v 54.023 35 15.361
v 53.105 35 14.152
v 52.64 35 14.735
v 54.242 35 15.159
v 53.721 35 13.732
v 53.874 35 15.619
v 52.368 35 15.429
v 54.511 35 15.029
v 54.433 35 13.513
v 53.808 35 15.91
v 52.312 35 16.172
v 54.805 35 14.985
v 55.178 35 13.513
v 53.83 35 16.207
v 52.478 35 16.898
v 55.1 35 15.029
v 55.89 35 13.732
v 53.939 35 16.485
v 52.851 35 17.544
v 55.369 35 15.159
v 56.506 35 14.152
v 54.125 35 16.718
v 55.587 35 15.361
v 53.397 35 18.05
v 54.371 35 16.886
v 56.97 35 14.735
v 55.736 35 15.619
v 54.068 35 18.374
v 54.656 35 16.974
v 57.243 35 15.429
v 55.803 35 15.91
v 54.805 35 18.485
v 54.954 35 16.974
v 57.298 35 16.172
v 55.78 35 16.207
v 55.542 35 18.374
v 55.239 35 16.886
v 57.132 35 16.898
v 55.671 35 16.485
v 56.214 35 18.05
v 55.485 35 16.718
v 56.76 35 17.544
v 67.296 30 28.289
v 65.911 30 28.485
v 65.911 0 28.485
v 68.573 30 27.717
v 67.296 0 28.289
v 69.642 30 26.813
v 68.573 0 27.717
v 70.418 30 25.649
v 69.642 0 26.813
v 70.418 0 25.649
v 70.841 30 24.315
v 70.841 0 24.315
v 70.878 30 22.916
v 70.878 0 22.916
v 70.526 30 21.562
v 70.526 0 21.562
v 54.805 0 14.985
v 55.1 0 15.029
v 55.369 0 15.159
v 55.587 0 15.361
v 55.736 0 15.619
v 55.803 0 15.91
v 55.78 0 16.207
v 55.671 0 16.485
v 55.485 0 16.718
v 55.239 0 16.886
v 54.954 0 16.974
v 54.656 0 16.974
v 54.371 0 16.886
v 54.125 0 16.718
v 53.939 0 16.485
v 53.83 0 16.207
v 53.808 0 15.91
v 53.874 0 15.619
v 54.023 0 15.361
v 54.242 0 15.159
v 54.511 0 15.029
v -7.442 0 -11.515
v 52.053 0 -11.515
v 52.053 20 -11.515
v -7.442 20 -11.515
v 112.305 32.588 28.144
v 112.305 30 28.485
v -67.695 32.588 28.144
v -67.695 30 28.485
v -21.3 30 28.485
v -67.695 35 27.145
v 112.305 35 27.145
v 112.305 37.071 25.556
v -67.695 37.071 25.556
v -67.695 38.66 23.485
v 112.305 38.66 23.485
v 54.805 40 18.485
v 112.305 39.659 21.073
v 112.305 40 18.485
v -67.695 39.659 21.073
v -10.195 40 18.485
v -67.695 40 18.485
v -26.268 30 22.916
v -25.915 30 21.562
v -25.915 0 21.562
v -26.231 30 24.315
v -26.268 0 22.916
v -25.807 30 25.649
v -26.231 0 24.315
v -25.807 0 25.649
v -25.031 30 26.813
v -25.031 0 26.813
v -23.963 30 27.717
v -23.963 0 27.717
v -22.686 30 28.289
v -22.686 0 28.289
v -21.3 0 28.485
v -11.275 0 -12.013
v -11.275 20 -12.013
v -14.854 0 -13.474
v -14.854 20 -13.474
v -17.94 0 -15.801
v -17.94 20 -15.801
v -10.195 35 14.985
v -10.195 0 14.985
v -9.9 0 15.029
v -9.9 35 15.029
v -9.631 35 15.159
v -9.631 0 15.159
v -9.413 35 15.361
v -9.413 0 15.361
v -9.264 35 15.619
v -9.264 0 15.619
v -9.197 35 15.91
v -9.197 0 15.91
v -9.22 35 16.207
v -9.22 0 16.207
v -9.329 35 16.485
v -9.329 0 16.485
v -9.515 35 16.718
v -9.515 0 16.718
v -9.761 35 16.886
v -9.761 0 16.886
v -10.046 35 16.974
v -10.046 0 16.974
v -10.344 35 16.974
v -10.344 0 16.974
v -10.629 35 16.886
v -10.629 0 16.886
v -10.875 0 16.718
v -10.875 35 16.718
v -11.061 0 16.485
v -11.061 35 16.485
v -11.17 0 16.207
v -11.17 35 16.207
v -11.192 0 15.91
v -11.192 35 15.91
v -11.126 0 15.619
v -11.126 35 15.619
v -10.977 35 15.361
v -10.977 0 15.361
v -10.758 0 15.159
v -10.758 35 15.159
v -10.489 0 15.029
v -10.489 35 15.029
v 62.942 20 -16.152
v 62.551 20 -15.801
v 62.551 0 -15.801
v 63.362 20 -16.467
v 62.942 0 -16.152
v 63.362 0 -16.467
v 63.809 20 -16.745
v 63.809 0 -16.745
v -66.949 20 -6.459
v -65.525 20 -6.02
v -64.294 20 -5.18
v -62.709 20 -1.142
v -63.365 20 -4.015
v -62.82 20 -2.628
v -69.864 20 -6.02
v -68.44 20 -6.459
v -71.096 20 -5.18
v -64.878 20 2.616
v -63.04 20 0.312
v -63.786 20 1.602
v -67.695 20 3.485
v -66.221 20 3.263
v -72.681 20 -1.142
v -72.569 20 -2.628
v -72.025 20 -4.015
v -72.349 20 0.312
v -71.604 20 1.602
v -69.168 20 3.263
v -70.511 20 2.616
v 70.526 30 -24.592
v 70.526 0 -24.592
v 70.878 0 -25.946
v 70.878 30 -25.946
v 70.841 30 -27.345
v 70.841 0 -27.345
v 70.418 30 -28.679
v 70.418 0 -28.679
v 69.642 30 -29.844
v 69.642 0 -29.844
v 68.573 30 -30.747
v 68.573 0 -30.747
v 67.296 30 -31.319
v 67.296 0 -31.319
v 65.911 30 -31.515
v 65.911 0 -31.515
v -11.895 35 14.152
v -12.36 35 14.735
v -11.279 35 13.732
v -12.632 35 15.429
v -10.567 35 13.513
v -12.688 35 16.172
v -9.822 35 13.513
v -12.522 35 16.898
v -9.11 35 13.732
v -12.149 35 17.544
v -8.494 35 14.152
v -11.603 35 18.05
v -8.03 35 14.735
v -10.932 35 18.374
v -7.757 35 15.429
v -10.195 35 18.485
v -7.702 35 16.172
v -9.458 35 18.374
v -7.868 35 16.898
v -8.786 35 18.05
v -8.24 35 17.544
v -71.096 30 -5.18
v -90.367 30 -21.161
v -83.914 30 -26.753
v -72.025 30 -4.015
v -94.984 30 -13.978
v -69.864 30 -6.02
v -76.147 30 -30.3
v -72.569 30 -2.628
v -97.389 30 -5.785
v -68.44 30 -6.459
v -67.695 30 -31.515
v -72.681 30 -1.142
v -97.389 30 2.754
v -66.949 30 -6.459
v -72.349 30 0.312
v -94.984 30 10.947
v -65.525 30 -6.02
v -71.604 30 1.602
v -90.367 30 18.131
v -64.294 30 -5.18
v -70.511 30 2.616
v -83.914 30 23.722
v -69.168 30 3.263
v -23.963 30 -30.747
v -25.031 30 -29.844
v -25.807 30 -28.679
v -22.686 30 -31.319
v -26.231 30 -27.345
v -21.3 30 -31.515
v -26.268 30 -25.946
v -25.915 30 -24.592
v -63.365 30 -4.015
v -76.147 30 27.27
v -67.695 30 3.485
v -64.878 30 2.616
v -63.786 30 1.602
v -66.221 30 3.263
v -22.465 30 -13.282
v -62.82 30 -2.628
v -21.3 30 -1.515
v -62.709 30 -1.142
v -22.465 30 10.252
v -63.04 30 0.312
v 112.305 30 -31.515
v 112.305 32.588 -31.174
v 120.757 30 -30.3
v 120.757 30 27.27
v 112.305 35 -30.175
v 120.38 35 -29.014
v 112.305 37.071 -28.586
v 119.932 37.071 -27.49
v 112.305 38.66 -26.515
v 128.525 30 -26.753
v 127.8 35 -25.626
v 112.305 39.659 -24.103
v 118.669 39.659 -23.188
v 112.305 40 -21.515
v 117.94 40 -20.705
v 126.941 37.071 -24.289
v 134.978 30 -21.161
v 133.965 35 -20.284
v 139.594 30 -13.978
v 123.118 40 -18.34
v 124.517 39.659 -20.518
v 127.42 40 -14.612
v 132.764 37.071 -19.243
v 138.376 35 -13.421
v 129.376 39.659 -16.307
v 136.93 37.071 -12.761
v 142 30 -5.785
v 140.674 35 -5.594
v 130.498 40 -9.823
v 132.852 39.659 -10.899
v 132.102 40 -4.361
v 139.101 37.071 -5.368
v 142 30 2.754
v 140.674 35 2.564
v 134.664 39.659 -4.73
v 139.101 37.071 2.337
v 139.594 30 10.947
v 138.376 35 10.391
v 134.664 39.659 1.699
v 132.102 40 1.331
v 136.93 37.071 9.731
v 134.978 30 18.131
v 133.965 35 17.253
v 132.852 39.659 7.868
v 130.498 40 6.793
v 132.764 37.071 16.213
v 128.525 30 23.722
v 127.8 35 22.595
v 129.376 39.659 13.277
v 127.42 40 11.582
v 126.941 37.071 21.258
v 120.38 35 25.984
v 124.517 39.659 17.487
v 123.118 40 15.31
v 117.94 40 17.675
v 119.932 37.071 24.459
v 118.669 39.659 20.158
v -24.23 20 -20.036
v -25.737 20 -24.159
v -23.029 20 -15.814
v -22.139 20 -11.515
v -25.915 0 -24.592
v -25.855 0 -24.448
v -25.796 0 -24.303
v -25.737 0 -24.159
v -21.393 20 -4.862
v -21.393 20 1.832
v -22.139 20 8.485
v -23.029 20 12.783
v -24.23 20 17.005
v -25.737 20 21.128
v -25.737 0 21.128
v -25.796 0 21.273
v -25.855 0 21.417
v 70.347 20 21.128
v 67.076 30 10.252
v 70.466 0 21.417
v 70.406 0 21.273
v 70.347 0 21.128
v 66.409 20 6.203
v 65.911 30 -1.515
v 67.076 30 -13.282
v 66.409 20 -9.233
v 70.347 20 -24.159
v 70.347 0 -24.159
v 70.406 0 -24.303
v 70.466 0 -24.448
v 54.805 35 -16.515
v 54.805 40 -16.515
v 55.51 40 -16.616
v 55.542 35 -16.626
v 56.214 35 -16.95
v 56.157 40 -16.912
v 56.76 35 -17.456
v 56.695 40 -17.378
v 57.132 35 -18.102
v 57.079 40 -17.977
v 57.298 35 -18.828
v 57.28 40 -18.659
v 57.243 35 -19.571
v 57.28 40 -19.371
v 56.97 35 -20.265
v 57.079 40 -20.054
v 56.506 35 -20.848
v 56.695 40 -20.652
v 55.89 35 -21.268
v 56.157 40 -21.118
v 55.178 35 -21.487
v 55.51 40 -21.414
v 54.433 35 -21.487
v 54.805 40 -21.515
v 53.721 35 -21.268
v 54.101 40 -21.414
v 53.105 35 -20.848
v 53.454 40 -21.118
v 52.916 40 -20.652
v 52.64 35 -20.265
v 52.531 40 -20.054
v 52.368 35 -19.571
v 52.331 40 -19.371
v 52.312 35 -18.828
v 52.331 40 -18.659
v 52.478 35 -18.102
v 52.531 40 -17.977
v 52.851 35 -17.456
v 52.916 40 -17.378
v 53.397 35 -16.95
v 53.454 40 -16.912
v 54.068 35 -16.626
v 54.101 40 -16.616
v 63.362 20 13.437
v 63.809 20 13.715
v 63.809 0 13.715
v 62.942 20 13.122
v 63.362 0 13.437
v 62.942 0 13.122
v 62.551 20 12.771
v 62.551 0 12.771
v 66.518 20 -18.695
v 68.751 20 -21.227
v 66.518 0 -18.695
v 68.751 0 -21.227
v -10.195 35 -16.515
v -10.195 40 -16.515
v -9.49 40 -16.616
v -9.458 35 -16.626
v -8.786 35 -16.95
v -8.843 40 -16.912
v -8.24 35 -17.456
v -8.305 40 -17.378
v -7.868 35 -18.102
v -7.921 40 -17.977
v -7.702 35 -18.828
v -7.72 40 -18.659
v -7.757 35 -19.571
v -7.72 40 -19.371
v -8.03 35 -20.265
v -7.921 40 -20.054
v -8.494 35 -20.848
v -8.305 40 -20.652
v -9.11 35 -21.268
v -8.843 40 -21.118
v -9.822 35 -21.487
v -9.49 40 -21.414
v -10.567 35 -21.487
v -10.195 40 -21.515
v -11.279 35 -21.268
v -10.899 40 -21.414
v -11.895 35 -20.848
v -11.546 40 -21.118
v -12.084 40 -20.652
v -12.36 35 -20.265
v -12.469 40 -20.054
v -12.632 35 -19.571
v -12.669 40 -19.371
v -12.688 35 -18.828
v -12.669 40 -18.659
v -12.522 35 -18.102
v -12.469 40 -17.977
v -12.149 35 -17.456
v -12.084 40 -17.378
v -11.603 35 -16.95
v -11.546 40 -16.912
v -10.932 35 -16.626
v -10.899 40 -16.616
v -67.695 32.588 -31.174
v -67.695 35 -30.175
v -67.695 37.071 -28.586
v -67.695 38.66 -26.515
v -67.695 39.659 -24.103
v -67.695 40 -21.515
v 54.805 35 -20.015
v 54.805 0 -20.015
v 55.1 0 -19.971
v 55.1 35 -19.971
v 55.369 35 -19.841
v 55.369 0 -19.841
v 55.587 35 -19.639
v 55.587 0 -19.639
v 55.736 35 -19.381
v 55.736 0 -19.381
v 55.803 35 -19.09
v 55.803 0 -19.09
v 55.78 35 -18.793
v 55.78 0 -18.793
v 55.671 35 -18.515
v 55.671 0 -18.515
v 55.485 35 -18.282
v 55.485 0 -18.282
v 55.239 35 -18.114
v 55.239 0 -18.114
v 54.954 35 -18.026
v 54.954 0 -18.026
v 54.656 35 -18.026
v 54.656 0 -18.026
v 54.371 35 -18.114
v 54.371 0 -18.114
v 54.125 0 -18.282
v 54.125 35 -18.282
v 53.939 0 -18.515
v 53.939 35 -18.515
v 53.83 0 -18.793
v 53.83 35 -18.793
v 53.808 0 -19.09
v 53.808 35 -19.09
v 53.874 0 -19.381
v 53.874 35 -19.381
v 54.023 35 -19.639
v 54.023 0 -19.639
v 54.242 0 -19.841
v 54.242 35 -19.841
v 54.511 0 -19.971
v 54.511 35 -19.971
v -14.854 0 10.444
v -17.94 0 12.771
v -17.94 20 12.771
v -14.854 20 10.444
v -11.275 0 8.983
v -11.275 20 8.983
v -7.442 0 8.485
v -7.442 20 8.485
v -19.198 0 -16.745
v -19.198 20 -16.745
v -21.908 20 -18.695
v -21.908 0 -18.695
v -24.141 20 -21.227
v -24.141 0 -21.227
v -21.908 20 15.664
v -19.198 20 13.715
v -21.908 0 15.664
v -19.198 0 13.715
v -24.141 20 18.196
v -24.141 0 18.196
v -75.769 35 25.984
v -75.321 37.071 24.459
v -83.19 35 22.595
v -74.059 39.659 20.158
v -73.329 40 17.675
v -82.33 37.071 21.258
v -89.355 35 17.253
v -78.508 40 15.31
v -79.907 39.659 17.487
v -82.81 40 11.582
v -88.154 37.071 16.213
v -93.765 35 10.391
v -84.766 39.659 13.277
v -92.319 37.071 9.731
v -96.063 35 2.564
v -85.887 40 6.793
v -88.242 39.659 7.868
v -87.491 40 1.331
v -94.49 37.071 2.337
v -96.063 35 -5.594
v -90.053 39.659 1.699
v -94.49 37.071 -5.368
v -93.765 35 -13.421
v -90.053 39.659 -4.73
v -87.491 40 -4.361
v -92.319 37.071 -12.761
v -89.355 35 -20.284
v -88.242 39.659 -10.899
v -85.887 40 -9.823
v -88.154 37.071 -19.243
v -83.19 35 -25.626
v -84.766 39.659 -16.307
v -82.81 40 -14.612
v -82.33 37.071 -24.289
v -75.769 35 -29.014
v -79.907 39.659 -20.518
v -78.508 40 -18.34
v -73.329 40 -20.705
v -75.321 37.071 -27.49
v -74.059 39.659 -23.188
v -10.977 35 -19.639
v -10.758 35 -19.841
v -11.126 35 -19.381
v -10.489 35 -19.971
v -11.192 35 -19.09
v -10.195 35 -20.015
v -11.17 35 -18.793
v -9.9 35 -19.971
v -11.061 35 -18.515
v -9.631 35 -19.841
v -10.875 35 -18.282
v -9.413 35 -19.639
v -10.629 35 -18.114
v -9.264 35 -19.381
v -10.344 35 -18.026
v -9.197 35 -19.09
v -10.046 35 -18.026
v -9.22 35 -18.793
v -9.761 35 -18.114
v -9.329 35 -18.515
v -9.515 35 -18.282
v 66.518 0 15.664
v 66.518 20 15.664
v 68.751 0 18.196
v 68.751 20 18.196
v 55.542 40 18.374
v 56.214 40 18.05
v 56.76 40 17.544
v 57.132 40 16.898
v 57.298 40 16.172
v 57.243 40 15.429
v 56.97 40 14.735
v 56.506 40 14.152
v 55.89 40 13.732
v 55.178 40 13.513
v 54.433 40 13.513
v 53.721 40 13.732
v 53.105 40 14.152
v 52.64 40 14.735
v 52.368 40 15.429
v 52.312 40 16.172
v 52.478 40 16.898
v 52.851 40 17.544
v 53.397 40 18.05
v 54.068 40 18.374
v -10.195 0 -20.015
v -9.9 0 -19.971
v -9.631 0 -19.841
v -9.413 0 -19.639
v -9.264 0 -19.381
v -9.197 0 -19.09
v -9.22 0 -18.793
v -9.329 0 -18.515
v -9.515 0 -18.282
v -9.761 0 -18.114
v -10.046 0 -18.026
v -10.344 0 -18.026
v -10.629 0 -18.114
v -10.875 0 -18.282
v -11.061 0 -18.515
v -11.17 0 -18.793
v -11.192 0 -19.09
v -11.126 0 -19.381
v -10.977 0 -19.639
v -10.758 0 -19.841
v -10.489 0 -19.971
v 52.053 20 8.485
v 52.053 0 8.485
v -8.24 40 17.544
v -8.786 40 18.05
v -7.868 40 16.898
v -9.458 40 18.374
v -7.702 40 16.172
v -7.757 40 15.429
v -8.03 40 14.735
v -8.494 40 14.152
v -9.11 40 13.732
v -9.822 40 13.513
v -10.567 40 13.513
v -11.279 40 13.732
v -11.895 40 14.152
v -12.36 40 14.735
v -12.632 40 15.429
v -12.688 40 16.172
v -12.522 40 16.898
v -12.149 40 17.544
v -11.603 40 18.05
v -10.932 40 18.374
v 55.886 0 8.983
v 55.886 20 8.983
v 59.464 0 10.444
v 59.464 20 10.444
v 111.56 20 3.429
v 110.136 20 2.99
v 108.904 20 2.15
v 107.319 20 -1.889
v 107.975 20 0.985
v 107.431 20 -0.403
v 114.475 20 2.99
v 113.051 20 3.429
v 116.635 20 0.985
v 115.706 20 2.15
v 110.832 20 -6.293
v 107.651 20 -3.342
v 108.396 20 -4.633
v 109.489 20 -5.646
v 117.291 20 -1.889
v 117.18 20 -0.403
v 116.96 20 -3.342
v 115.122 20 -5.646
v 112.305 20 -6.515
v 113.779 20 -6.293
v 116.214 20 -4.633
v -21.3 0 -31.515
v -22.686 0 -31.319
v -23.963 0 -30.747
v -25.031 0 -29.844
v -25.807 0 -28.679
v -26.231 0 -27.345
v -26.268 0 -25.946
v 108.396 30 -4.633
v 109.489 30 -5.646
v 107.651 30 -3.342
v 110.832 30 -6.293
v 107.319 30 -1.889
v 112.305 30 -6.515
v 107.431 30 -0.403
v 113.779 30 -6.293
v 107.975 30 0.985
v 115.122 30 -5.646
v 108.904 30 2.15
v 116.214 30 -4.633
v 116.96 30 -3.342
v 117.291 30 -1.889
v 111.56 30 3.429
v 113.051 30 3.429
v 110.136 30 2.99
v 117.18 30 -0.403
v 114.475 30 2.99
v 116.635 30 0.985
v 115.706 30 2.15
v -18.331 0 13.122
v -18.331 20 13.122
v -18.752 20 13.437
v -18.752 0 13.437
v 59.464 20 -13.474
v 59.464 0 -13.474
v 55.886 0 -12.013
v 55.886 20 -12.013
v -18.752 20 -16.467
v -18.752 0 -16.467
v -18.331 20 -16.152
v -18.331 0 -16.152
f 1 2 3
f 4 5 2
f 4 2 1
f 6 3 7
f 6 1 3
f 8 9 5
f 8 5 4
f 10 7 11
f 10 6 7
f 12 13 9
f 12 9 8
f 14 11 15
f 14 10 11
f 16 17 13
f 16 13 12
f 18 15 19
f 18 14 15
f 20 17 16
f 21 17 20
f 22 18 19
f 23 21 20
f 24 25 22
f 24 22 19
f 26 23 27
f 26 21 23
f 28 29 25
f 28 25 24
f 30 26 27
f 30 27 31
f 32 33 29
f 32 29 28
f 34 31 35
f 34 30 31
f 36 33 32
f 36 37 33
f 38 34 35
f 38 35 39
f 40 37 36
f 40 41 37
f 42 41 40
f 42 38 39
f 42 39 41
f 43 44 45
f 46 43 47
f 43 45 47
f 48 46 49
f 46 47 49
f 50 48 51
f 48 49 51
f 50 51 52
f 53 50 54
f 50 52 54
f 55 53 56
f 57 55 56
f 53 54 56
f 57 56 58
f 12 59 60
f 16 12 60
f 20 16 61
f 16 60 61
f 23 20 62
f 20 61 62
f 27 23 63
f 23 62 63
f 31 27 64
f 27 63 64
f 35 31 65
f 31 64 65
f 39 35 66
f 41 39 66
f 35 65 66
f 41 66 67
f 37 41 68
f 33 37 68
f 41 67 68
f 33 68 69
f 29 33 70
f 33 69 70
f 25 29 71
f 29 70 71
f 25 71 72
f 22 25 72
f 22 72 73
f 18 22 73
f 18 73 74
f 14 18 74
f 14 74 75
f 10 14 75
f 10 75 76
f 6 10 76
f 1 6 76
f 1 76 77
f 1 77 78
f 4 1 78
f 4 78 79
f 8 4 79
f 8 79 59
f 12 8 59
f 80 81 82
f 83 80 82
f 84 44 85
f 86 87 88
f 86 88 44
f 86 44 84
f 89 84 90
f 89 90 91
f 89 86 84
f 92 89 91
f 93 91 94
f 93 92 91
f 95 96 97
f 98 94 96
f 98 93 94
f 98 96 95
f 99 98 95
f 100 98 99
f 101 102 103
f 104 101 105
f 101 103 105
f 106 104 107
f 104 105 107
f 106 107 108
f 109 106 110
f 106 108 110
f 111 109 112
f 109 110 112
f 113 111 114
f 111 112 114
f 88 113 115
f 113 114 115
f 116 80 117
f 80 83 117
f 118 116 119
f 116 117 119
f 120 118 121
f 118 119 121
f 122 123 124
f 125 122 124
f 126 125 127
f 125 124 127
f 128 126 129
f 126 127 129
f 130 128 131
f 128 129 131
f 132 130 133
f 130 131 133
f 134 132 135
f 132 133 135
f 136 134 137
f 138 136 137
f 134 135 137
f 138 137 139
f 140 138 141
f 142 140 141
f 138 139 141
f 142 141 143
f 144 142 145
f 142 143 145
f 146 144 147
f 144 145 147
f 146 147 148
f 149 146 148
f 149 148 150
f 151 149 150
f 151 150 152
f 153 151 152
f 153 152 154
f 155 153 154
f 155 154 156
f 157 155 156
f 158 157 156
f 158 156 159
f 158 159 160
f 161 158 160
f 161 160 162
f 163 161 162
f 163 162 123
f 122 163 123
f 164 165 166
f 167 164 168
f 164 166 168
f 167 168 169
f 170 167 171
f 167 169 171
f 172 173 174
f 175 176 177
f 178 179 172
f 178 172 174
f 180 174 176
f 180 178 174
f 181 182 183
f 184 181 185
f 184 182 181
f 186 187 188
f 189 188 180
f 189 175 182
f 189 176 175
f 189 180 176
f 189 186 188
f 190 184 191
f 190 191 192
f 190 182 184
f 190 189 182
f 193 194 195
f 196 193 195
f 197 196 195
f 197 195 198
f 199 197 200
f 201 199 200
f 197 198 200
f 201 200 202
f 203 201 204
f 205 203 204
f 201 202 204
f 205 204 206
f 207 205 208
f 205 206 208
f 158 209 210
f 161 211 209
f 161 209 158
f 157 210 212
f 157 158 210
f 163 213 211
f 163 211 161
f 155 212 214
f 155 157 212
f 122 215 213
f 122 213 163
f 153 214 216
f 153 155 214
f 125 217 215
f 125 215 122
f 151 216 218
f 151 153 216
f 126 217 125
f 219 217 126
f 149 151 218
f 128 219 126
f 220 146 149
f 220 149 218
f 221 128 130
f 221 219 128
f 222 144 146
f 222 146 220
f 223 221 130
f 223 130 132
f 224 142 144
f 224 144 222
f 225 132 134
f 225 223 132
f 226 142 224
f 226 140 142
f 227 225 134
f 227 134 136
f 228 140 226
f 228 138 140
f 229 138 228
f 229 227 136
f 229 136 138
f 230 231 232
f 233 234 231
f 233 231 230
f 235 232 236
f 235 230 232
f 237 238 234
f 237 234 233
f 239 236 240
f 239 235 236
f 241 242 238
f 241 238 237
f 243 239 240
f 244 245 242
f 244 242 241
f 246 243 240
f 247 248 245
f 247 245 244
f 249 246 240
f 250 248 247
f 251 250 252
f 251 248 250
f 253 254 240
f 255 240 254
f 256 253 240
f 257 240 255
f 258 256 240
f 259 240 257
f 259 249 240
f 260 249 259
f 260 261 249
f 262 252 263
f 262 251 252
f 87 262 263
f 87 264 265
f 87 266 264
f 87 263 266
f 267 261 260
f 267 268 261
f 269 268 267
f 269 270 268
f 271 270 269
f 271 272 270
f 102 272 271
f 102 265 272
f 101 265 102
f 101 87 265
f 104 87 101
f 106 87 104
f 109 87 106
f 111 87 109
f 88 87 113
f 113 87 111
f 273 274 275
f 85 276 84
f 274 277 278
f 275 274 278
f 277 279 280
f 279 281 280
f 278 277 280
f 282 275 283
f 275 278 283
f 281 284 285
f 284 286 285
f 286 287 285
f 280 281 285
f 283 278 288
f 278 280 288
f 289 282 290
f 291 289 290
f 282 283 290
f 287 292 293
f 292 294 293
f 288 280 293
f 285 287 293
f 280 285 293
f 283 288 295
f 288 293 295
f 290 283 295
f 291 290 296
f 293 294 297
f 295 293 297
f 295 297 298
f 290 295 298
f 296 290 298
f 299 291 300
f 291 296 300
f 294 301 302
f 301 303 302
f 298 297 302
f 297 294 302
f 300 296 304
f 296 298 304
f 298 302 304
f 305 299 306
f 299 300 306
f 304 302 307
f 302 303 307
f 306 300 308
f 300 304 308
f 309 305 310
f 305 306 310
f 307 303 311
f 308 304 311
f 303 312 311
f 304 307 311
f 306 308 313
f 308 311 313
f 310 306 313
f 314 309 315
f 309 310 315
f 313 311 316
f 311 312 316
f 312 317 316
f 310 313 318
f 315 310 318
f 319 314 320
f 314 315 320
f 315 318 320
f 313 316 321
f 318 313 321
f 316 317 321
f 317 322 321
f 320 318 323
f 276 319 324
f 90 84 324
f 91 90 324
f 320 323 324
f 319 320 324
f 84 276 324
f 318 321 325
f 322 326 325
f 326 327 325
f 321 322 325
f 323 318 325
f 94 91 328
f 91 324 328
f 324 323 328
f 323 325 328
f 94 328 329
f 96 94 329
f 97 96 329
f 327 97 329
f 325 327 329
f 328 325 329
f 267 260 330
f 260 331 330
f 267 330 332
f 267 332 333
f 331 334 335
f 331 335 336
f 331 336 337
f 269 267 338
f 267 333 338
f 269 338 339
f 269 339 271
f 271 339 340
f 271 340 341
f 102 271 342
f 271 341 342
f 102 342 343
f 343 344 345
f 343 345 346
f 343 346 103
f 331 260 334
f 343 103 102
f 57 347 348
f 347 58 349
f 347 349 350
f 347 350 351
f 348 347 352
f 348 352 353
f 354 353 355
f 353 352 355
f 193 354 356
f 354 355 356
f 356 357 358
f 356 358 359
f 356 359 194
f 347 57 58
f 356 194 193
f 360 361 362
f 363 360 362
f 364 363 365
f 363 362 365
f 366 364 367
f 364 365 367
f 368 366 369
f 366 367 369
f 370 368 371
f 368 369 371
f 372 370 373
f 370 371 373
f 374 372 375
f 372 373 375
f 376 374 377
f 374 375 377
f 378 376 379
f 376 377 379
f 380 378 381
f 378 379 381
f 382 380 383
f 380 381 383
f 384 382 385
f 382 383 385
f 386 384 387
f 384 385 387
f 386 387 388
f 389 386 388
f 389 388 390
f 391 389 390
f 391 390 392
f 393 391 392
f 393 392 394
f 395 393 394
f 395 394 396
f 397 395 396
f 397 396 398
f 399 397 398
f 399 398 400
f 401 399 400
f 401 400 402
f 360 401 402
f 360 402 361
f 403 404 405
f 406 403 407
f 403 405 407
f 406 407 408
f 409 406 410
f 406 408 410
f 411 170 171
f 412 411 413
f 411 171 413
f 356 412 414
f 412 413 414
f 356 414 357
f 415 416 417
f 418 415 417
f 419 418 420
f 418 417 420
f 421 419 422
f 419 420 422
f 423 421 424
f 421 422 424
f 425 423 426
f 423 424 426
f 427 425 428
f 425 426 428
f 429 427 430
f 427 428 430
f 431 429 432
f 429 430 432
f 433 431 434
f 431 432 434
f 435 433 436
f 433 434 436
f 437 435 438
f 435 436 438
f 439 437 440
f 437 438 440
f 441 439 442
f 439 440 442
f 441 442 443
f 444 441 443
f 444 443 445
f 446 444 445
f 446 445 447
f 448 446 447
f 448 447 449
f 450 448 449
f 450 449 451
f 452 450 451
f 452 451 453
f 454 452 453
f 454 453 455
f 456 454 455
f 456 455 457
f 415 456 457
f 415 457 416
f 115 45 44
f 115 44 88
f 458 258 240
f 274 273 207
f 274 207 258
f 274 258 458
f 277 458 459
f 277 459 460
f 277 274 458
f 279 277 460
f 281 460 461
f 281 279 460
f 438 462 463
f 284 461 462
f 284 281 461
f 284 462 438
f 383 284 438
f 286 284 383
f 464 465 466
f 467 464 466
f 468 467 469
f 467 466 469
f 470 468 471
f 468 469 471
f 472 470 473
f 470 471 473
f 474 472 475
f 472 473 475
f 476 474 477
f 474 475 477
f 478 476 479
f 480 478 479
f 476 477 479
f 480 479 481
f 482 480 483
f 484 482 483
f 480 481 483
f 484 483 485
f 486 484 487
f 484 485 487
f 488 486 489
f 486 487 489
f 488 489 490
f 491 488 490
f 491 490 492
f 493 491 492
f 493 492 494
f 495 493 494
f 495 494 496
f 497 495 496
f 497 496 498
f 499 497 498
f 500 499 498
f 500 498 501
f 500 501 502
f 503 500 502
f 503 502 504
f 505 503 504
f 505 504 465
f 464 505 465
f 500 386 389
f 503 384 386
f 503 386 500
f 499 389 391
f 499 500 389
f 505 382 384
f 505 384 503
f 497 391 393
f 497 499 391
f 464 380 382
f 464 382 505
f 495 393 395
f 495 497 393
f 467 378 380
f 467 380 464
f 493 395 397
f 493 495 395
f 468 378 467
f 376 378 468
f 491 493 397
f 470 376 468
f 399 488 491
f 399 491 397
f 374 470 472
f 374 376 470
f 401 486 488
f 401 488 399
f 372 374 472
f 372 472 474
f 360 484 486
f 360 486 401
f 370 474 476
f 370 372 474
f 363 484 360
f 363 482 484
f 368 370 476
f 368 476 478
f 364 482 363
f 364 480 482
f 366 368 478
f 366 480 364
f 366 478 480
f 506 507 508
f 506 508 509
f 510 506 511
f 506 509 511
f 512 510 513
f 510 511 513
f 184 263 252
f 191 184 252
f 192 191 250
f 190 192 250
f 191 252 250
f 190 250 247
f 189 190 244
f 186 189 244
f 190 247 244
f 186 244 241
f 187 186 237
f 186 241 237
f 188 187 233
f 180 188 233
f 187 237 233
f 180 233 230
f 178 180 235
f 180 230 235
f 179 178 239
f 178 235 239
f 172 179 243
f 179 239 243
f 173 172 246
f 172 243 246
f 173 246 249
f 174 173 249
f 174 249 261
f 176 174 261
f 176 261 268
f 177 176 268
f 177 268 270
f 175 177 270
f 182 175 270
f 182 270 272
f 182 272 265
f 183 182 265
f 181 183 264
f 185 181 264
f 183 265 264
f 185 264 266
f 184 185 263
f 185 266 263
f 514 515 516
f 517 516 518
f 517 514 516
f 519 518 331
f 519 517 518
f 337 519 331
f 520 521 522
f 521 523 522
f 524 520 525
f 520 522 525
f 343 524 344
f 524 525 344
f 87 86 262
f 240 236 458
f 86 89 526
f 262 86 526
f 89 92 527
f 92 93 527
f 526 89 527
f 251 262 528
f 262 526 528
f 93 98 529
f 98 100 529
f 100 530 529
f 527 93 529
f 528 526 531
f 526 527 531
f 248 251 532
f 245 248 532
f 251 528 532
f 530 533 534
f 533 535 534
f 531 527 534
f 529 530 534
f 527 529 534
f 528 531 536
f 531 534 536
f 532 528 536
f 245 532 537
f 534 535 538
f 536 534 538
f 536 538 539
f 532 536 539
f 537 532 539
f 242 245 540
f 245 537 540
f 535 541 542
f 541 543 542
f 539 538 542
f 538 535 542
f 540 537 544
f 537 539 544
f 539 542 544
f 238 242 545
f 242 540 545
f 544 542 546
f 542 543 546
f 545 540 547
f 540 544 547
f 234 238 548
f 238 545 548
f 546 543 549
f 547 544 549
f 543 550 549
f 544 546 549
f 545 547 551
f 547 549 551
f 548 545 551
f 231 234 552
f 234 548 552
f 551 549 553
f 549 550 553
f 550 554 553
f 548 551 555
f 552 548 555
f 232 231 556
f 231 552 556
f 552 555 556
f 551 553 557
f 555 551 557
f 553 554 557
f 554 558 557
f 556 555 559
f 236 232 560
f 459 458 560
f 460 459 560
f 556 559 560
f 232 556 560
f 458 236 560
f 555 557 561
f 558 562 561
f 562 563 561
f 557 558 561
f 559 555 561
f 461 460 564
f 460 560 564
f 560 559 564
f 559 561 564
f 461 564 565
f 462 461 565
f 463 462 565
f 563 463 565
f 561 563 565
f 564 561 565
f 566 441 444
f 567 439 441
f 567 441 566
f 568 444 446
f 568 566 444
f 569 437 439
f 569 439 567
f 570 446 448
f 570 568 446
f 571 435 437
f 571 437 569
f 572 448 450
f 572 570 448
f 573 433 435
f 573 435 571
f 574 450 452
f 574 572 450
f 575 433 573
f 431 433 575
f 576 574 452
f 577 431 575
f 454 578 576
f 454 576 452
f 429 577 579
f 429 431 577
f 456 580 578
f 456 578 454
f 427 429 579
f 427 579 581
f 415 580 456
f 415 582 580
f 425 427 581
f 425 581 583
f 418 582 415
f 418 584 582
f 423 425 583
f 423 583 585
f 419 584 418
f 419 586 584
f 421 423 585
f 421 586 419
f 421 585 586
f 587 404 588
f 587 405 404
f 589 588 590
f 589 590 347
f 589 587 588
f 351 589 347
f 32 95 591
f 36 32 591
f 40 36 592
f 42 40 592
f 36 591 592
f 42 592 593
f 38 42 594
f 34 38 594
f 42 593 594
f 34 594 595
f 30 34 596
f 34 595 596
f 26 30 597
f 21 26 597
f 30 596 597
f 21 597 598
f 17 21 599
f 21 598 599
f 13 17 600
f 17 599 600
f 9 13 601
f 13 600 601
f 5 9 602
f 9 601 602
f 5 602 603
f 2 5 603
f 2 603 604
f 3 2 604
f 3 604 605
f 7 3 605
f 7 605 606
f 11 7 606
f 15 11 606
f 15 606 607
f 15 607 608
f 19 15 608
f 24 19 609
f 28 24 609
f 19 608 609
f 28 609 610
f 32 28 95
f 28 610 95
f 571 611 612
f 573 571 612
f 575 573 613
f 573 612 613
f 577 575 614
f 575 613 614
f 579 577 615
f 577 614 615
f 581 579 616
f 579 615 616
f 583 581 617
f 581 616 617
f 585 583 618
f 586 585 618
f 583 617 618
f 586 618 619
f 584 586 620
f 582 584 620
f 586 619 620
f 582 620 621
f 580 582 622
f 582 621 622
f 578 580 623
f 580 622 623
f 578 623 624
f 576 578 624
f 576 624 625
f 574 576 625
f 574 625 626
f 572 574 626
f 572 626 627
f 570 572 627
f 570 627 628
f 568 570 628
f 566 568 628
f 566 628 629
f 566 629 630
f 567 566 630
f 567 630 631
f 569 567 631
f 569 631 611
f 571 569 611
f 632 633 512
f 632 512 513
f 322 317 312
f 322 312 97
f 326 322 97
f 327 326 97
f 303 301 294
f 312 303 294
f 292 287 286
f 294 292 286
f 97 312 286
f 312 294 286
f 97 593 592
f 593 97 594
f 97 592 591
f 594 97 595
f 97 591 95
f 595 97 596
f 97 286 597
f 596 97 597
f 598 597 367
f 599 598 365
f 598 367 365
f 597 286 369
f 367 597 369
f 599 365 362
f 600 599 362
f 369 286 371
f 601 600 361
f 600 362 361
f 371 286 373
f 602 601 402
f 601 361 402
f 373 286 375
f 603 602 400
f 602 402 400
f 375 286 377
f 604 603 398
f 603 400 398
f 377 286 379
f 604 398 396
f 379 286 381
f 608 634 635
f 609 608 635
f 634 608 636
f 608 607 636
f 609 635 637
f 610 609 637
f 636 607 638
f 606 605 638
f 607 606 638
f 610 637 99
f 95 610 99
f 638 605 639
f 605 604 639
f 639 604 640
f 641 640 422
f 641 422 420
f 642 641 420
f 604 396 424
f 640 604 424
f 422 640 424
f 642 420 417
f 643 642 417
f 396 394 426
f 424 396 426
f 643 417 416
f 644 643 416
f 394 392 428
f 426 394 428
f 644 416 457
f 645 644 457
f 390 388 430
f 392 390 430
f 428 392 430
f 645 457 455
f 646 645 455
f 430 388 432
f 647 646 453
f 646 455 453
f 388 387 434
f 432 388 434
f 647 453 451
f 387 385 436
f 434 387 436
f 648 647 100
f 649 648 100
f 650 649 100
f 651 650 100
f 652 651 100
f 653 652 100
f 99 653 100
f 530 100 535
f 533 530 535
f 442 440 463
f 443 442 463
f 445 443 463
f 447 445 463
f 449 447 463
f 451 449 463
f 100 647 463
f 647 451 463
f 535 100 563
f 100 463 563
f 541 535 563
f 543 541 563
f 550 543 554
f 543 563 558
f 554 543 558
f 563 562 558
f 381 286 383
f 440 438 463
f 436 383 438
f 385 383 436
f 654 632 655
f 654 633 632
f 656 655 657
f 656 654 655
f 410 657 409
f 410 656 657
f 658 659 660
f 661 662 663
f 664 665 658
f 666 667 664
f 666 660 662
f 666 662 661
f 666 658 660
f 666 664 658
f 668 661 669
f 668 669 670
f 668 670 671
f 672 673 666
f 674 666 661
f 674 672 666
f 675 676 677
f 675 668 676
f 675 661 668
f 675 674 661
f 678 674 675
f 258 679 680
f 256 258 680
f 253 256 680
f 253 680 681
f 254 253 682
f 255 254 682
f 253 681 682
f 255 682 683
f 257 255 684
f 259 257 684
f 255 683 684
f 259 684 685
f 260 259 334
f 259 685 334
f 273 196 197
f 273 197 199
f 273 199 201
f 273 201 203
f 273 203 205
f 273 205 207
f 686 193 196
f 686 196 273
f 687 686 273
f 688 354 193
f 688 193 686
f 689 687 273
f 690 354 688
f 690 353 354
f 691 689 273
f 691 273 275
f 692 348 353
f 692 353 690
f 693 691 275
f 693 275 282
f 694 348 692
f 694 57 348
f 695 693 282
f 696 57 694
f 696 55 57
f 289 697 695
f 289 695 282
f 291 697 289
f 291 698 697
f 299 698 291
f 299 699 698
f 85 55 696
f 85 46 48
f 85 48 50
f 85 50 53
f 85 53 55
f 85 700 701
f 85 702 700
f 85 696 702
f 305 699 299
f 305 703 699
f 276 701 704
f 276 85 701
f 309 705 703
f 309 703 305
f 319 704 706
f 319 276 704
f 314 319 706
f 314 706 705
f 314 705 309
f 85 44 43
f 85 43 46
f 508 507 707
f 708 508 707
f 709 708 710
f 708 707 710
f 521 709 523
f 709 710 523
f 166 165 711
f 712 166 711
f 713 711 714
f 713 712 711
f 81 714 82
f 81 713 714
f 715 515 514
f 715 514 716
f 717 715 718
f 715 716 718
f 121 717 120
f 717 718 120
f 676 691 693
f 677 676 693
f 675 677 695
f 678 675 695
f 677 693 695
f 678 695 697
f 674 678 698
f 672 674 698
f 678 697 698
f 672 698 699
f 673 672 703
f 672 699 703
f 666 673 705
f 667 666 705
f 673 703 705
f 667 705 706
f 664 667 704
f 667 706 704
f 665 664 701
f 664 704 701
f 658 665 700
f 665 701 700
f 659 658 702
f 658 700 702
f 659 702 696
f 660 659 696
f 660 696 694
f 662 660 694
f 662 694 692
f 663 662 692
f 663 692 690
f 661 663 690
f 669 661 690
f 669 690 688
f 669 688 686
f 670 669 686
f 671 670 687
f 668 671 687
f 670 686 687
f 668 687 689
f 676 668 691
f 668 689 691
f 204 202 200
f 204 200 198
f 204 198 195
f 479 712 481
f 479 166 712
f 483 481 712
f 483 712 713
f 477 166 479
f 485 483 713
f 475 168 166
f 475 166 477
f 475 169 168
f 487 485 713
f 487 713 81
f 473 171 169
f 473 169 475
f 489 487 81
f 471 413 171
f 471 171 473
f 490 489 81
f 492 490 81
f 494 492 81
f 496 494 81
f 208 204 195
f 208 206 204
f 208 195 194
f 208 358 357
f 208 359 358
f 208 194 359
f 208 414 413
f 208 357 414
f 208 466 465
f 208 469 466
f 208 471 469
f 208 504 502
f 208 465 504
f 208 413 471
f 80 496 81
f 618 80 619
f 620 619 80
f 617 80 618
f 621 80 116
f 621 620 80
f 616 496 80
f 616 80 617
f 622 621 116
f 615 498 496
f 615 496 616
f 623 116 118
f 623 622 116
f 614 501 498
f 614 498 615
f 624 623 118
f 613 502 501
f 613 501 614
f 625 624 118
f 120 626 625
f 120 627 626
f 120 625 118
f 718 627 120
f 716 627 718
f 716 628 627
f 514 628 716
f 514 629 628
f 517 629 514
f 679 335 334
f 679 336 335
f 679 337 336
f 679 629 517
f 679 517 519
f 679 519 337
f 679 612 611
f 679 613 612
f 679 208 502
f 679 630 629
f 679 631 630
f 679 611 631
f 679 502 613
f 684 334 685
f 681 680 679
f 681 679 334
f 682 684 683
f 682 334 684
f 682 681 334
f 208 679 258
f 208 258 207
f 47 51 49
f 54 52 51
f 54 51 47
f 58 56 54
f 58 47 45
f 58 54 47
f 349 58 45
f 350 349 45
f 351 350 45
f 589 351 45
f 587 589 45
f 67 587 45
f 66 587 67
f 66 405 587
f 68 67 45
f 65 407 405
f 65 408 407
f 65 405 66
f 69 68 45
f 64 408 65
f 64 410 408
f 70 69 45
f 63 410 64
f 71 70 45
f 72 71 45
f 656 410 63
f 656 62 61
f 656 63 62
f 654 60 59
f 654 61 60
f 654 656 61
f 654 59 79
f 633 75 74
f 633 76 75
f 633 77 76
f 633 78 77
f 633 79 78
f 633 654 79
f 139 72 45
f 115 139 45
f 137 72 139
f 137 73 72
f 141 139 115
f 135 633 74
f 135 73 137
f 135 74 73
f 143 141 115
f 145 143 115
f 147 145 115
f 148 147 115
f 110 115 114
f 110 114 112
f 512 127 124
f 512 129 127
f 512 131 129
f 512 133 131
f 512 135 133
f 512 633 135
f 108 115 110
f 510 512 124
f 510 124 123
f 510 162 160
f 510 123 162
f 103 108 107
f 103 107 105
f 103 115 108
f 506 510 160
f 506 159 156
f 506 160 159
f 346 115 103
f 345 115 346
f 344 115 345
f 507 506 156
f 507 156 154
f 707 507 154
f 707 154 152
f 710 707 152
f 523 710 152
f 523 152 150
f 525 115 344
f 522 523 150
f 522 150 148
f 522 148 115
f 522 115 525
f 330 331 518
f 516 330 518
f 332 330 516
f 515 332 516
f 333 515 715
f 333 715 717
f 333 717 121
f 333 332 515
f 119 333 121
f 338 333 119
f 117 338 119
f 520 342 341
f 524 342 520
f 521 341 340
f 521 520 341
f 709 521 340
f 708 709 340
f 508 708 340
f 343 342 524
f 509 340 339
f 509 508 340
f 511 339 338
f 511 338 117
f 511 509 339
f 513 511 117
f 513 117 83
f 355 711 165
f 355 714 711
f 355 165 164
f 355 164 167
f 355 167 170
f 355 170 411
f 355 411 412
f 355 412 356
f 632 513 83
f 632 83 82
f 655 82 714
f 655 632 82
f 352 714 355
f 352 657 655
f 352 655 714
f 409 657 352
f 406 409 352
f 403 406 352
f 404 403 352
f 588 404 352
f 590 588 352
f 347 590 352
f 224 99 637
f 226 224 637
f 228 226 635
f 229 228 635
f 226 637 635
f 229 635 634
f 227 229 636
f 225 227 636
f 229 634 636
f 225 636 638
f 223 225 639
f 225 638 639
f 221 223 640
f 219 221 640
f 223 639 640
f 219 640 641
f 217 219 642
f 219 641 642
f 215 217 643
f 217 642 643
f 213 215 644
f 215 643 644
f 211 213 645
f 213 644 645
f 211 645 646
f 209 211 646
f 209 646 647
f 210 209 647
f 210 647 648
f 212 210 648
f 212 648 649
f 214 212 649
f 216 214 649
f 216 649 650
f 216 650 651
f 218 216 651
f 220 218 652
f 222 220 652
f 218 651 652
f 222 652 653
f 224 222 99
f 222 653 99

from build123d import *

# Parameters (mm, degrees)
BOSS_EXTRUDE1_DEPTH     = 40
FILLET1_R               = 10
CUT_EXTRUDE1_DEPTH      = 30
SKETCH4_R               = 5
BOSS_EXTRUDE3_DEPTH     = 10
CUT_EXTRUDE2_REACH      = 181.038
CUT_EXTRUDE2_END_RADIUS = 60
SKETCH5_W               = 20
SKETCH5_H               = 40
FILLET2_R               = 5
CUT_EXTRUDE3_REACH      = 153.142
SKETCH6_R               = 1
SKETCH7_R               = 2.5
CUT_EXTRUDE4_DEPTH      = 5
SKETCH8_R               = 6
CUT_EXTRUDE5_DEPTH      = 20
FILLET3_R               = 15


with BuildPart() as part:
    # Sketch1 → Boss-Extrude1 (new body)
    with BuildSketch(Plane(origin=(0, 0, 0), x_dir=(1, 0, 0), z_dir=(0, 1, 0))):
        with BuildLine():
            Line((-67.694698117, 31.515169882), (112.305301883, 31.515169882))
            ThreePointArc((112.305301883, 31.515169882), (142.305301883, 1.515169882), (112.305301883, -28.484830118))
            Line((112.305301883, -28.484830118), (-67.694698117, -28.484830118))
            ThreePointArc((-67.694698117, -28.484830118), (-97.694698117, 1.515169882), (-67.694698117, 31.515169882))
        make_face()
    extrude(amount=BOSS_EXTRUDE1_DEPTH)

    # Fillet1
    fillet1_edges = [part.edges().sort_by_distance(p)[0] for p in [
        (142.305301883, 40, -1.515169882),
        (22.305301883, 40, -31.515169882),
        (-97.694698117, 40, -1.515169882),
        (22.305301883, 40, 28.484830118),
    ]]
    fillet(fillet1_edges, radius=FILLET1_R)

    # Sketch3 → Cut-Extrude1 (cut)
    with BuildSketch(Plane.XZ):
        with BuildLine():
            Line((73.949041486, -31.515169882), (148.949041486, -31.515169882))
            Line((148.949041486, -31.515169882), (148.949041486, 28.484830118))
            Line((148.949041486, 28.484830118), (73.949041486, 28.484830118))
            ThreePointArc((73.949041486, 28.484830118), (65.910565713, -1.515169882), (73.949041486, -31.515169882))
        make_face()
        with BuildLine():
            Line((-29.33843772, 28.484830118), (-104.33843772, 28.484830118))
            Line((-104.33843772, 28.484830118), (-104.33843772, -31.515169882))
            Line((-104.33843772, -31.515169882), (-29.33843772, -31.515169882))
            ThreePointArc((-29.33843772, -31.515169882), (-21.299961947, -1.515169882), (-29.33843772, 28.484830118))
        make_face()
    extrude(amount=-CUT_EXTRUDE1_DEPTH, mode=Mode.SUBTRACT)

    # Sketch4 → Boss-Extrude3 (add)
    with BuildSketch(Plane(origin=(0, 30, 0), x_dir=(-1, 0, 0), z_dir=(0, -1, 0))):
        with Locations(Location((-112.305301883, 1.515169882, 0), (0, 0, 90))):
            Circle(SKETCH4_R)
        with Locations(Location((67.694698117, 1.515169882, 0), (0, 0, 270))):
            Circle(SKETCH4_R)
    extrude(amount=BOSS_EXTRUDE3_DEPTH)

    # Cut-Extrude2: up to this cylinder (the profile starts outside it)
    cut_extrude2_end = Plane(origin=(-81.299961947, 0, -1.515169882), z_dir=(0, -1, 0)) * Cylinder(CUT_EXTRUDE2_END_RADIUS, 483.076, mode=Mode.PRIVATE)
    # Sketch5 → Cut-Extrude2 (cut, up to the surface)
    with BuildSketch(Plane(origin=(73.949041486, 0, 0), x_dir=(0, 0, -1), z_dir=(1, 0, 0)), mode=Mode.PRIVATE) as cut_extrude2_sk1:
        with Locations((1.515169882, 0)):
            Rectangle(SKETCH5_W, SKETCH5_H)
    cut_extrude2_tool1 = extrude(cut_extrude2_sk1.sketch, amount=-CUT_EXTRUDE2_REACH, mode=Mode.PRIVATE) - cut_extrude2_end
    add(cut_extrude2_tool1.solids().sort_by_distance((73.949041, 0, -1.51517))[0], mode=Mode.SUBTRACT)

    # Fillet2
    # the kernel refuses this fillet: 5 mm, written as the material it takes off along each edge
    with BuildSketch(Plane(origin=(-29.33843772, -20.096189432, 28.484830118), x_dir=(0.44322659401027775, 0, -0.8964096085841831), z_dir=(0, 1, 0))) as fillet2_piece_1:
        with BuildLine():
            CenterArc((8.044914281, -4.989633951), FILLET2_R, 93.690067526, 112.619864948)
            Line((3.562866238, -7.205766921), (0, 0))
            ThreePointArc((0, 0), (3.861558855, -0.124392586), (7.72311771, 0))
        make_face()
    extrude(amount=50.096189432, mode=Mode.SUBTRACT)
    with BuildSketch(Plane(origin=(-29.33843772, -20.096189432, -31.515169882), x_dir=(1, 0, 0), z_dir=(0, 1, 0))) as fillet2_piece_2:
        with BuildLine():
            CenterArc((8.038475773, -5), FILLET2_R, 90, 112.619864948)
            ThreePointArc((3.423091158, -6.923076923), (1.823052288, -3.406404359), (0, 0))
            Line((0, 0), (8.038475773, 0))
        make_face()
    extrude(amount=50.096189432, mode=Mode.SUBTRACT)
    with BuildSketch(Plane(origin=(73.949041486, -20.096189432, -31.515169882), x_dir=(-1, 0, 0), z_dir=(0, 1, 0))) as fillet2_piece_3:
        with BuildLine():
            CenterArc((8.038475773, 5), FILLET2_R, 157.380135052, 112.619864948)
            ThreePointArc((3.423091158, 6.923076923), (1.823052288, 3.406404359), (0, 0))
            Line((0, 0), (8.038475773, 0))
        make_face()
    extrude(amount=50.096189432, mode=Mode.SUBTRACT)
    with BuildSketch(Plane(origin=(73.949041486, -20.096189432, 28.484830118), x_dir=(-0.4432265940102763, 0, -0.8964096085841838), z_dir=(0, 1, 0))) as fillet2_piece_4:
        with BuildLine():
            CenterArc((8.044914281, 4.989633951), FILLET2_R, 153.690067526, 112.619864948)
            Line((3.562866238, 7.205766921), (0, 0))
            ThreePointArc((0, 0), (3.861558855, 0.124392586), (7.72311771, 0))
        make_face()
    extrude(amount=50.096189432, mode=Mode.SUBTRACT)

    # Sketch6 → Cut-Extrude3 (cut, up to next)
    with BuildSketch(Plane(origin=(0, 0, 0), x_dir=(-1, 0, 0), z_dir=(0, -1, 0)), mode=Mode.PRIVATE) as cut_extrude3_sk1:
        with Locations(Location((10.194698117, -15.984830118, 0), (0, 0, 90))):
            Circle(SKETCH6_R)
    cut_extrude3_tool1 = extrude(cut_extrude3_sk1.sketch, amount=-CUT_EXTRUDE3_REACH, mode=Mode.PRIVATE) & part.part
    # Sketch6 → Cut-Extrude3 (cut, up to next)
    with BuildSketch(Plane(origin=(0, 0, 0), x_dir=(-1, 0, 0), z_dir=(0, -1, 0)), mode=Mode.PRIVATE) as cut_extrude3_sk2:
        with Locations(Location((-54.805301883, -15.984830118, 0), (0, 0, 90))):
            Circle(SKETCH6_R)
    cut_extrude3_tool2 = extrude(cut_extrude3_sk2.sketch, amount=-CUT_EXTRUDE3_REACH, mode=Mode.PRIVATE) & part.part
    # Sketch6 → Cut-Extrude3 (cut, up to next)
    with BuildSketch(Plane(origin=(0, 0, 0), x_dir=(-1, 0, 0), z_dir=(0, -1, 0)), mode=Mode.PRIVATE) as cut_extrude3_sk3:
        with Locations(Location((-54.805301883, 19.015169882, 0), (0, 0, 90))):
            Circle(SKETCH6_R)
    cut_extrude3_tool3 = extrude(cut_extrude3_sk3.sketch, amount=-CUT_EXTRUDE3_REACH, mode=Mode.PRIVATE) & part.part
    # Sketch6 → Cut-Extrude3 (cut, up to next)
    with BuildSketch(Plane(origin=(0, 0, 0), x_dir=(-1, 0, 0), z_dir=(0, -1, 0)), mode=Mode.PRIVATE) as cut_extrude3_sk4:
        with Locations(Location((10.194698117, 19.015169882, 0), (0, 0, 90))):
            Circle(SKETCH6_R)
    cut_extrude3_tool4 = extrude(cut_extrude3_sk4.sketch, amount=-CUT_EXTRUDE3_REACH, mode=Mode.PRIVATE) & part.part
    add(cut_extrude3_tool1.solids().sort_by_distance((-10.194698, 0, 15.98483))[0], mode=Mode.SUBTRACT)
    add(cut_extrude3_tool2.solids().sort_by_distance((54.805302, 0, 15.98483))[0], mode=Mode.SUBTRACT)
    add(cut_extrude3_tool3.solids().sort_by_distance((54.805302, 0, -19.01517))[0], mode=Mode.SUBTRACT)
    add(cut_extrude3_tool4.solids().sort_by_distance((-10.194698, 0, -19.01517))[0], mode=Mode.SUBTRACT)

    # Sketch7 → Cut-Extrude4 (cut)
    with BuildSketch(Plane(origin=(0, 40, 0), x_dir=(1, 0, 0), z_dir=(0, 1, 0))):
        with Locations(Location((-10.194698117, 19.015169882, 0), (0, 0, 270))):
            Circle(SKETCH7_R)
        with Locations(Location((-10.194698117, -15.984830118, 0), (0, 0, 270))):
            Circle(SKETCH7_R)
        with Locations(Location((54.805301883, -15.984830118, 0), (0, 0, 270))):
            Circle(SKETCH7_R)
        with Locations(Location((54.805301883, 19.015169882, 0), (0, 0, 270))):
            Circle(SKETCH7_R)
    extrude(amount=-CUT_EXTRUDE4_DEPTH, mode=Mode.SUBTRACT)

    # Sketch8 → Cut-Extrude5 (cut)
    with BuildSketch(Plane.XZ):
        with Locations((-22.139164116, 8.484830118)):
            Circle(SKETCH8_R)
        with Locations((-22.139164116, -11.515169882)):
            Circle(SKETCH8_R)
        with Locations((66.749767882, -11.515169882)):
            Circle(SKETCH8_R)
        with Locations((66.749767882, 8.484830118)):
            Circle(SKETCH8_R)
    extrude(amount=-CUT_EXTRUDE5_DEPTH, mode=Mode.SUBTRACT)

    # Fillet3
    fillet3_edges = [part.edges().sort_by_distance(p)[0] for p in [
        (-16.139164116, 10, -11.515169882),
        (60.749767882, 10, -11.515169882),
        (68.044321089, 10, 14.343510174),
        (60.749767882, 10, 8.484830118),
        (68.044321089, 10, -17.373849938),
        (-23.433717323, 10, -17.373849938),
        (-23.433717323, 10, 14.343510174),
        (-16.139164116, 10, 8.484830118),
    ]]
    fillet(fillet3_edges, radius=FILLET3_R)


solid = part.part
